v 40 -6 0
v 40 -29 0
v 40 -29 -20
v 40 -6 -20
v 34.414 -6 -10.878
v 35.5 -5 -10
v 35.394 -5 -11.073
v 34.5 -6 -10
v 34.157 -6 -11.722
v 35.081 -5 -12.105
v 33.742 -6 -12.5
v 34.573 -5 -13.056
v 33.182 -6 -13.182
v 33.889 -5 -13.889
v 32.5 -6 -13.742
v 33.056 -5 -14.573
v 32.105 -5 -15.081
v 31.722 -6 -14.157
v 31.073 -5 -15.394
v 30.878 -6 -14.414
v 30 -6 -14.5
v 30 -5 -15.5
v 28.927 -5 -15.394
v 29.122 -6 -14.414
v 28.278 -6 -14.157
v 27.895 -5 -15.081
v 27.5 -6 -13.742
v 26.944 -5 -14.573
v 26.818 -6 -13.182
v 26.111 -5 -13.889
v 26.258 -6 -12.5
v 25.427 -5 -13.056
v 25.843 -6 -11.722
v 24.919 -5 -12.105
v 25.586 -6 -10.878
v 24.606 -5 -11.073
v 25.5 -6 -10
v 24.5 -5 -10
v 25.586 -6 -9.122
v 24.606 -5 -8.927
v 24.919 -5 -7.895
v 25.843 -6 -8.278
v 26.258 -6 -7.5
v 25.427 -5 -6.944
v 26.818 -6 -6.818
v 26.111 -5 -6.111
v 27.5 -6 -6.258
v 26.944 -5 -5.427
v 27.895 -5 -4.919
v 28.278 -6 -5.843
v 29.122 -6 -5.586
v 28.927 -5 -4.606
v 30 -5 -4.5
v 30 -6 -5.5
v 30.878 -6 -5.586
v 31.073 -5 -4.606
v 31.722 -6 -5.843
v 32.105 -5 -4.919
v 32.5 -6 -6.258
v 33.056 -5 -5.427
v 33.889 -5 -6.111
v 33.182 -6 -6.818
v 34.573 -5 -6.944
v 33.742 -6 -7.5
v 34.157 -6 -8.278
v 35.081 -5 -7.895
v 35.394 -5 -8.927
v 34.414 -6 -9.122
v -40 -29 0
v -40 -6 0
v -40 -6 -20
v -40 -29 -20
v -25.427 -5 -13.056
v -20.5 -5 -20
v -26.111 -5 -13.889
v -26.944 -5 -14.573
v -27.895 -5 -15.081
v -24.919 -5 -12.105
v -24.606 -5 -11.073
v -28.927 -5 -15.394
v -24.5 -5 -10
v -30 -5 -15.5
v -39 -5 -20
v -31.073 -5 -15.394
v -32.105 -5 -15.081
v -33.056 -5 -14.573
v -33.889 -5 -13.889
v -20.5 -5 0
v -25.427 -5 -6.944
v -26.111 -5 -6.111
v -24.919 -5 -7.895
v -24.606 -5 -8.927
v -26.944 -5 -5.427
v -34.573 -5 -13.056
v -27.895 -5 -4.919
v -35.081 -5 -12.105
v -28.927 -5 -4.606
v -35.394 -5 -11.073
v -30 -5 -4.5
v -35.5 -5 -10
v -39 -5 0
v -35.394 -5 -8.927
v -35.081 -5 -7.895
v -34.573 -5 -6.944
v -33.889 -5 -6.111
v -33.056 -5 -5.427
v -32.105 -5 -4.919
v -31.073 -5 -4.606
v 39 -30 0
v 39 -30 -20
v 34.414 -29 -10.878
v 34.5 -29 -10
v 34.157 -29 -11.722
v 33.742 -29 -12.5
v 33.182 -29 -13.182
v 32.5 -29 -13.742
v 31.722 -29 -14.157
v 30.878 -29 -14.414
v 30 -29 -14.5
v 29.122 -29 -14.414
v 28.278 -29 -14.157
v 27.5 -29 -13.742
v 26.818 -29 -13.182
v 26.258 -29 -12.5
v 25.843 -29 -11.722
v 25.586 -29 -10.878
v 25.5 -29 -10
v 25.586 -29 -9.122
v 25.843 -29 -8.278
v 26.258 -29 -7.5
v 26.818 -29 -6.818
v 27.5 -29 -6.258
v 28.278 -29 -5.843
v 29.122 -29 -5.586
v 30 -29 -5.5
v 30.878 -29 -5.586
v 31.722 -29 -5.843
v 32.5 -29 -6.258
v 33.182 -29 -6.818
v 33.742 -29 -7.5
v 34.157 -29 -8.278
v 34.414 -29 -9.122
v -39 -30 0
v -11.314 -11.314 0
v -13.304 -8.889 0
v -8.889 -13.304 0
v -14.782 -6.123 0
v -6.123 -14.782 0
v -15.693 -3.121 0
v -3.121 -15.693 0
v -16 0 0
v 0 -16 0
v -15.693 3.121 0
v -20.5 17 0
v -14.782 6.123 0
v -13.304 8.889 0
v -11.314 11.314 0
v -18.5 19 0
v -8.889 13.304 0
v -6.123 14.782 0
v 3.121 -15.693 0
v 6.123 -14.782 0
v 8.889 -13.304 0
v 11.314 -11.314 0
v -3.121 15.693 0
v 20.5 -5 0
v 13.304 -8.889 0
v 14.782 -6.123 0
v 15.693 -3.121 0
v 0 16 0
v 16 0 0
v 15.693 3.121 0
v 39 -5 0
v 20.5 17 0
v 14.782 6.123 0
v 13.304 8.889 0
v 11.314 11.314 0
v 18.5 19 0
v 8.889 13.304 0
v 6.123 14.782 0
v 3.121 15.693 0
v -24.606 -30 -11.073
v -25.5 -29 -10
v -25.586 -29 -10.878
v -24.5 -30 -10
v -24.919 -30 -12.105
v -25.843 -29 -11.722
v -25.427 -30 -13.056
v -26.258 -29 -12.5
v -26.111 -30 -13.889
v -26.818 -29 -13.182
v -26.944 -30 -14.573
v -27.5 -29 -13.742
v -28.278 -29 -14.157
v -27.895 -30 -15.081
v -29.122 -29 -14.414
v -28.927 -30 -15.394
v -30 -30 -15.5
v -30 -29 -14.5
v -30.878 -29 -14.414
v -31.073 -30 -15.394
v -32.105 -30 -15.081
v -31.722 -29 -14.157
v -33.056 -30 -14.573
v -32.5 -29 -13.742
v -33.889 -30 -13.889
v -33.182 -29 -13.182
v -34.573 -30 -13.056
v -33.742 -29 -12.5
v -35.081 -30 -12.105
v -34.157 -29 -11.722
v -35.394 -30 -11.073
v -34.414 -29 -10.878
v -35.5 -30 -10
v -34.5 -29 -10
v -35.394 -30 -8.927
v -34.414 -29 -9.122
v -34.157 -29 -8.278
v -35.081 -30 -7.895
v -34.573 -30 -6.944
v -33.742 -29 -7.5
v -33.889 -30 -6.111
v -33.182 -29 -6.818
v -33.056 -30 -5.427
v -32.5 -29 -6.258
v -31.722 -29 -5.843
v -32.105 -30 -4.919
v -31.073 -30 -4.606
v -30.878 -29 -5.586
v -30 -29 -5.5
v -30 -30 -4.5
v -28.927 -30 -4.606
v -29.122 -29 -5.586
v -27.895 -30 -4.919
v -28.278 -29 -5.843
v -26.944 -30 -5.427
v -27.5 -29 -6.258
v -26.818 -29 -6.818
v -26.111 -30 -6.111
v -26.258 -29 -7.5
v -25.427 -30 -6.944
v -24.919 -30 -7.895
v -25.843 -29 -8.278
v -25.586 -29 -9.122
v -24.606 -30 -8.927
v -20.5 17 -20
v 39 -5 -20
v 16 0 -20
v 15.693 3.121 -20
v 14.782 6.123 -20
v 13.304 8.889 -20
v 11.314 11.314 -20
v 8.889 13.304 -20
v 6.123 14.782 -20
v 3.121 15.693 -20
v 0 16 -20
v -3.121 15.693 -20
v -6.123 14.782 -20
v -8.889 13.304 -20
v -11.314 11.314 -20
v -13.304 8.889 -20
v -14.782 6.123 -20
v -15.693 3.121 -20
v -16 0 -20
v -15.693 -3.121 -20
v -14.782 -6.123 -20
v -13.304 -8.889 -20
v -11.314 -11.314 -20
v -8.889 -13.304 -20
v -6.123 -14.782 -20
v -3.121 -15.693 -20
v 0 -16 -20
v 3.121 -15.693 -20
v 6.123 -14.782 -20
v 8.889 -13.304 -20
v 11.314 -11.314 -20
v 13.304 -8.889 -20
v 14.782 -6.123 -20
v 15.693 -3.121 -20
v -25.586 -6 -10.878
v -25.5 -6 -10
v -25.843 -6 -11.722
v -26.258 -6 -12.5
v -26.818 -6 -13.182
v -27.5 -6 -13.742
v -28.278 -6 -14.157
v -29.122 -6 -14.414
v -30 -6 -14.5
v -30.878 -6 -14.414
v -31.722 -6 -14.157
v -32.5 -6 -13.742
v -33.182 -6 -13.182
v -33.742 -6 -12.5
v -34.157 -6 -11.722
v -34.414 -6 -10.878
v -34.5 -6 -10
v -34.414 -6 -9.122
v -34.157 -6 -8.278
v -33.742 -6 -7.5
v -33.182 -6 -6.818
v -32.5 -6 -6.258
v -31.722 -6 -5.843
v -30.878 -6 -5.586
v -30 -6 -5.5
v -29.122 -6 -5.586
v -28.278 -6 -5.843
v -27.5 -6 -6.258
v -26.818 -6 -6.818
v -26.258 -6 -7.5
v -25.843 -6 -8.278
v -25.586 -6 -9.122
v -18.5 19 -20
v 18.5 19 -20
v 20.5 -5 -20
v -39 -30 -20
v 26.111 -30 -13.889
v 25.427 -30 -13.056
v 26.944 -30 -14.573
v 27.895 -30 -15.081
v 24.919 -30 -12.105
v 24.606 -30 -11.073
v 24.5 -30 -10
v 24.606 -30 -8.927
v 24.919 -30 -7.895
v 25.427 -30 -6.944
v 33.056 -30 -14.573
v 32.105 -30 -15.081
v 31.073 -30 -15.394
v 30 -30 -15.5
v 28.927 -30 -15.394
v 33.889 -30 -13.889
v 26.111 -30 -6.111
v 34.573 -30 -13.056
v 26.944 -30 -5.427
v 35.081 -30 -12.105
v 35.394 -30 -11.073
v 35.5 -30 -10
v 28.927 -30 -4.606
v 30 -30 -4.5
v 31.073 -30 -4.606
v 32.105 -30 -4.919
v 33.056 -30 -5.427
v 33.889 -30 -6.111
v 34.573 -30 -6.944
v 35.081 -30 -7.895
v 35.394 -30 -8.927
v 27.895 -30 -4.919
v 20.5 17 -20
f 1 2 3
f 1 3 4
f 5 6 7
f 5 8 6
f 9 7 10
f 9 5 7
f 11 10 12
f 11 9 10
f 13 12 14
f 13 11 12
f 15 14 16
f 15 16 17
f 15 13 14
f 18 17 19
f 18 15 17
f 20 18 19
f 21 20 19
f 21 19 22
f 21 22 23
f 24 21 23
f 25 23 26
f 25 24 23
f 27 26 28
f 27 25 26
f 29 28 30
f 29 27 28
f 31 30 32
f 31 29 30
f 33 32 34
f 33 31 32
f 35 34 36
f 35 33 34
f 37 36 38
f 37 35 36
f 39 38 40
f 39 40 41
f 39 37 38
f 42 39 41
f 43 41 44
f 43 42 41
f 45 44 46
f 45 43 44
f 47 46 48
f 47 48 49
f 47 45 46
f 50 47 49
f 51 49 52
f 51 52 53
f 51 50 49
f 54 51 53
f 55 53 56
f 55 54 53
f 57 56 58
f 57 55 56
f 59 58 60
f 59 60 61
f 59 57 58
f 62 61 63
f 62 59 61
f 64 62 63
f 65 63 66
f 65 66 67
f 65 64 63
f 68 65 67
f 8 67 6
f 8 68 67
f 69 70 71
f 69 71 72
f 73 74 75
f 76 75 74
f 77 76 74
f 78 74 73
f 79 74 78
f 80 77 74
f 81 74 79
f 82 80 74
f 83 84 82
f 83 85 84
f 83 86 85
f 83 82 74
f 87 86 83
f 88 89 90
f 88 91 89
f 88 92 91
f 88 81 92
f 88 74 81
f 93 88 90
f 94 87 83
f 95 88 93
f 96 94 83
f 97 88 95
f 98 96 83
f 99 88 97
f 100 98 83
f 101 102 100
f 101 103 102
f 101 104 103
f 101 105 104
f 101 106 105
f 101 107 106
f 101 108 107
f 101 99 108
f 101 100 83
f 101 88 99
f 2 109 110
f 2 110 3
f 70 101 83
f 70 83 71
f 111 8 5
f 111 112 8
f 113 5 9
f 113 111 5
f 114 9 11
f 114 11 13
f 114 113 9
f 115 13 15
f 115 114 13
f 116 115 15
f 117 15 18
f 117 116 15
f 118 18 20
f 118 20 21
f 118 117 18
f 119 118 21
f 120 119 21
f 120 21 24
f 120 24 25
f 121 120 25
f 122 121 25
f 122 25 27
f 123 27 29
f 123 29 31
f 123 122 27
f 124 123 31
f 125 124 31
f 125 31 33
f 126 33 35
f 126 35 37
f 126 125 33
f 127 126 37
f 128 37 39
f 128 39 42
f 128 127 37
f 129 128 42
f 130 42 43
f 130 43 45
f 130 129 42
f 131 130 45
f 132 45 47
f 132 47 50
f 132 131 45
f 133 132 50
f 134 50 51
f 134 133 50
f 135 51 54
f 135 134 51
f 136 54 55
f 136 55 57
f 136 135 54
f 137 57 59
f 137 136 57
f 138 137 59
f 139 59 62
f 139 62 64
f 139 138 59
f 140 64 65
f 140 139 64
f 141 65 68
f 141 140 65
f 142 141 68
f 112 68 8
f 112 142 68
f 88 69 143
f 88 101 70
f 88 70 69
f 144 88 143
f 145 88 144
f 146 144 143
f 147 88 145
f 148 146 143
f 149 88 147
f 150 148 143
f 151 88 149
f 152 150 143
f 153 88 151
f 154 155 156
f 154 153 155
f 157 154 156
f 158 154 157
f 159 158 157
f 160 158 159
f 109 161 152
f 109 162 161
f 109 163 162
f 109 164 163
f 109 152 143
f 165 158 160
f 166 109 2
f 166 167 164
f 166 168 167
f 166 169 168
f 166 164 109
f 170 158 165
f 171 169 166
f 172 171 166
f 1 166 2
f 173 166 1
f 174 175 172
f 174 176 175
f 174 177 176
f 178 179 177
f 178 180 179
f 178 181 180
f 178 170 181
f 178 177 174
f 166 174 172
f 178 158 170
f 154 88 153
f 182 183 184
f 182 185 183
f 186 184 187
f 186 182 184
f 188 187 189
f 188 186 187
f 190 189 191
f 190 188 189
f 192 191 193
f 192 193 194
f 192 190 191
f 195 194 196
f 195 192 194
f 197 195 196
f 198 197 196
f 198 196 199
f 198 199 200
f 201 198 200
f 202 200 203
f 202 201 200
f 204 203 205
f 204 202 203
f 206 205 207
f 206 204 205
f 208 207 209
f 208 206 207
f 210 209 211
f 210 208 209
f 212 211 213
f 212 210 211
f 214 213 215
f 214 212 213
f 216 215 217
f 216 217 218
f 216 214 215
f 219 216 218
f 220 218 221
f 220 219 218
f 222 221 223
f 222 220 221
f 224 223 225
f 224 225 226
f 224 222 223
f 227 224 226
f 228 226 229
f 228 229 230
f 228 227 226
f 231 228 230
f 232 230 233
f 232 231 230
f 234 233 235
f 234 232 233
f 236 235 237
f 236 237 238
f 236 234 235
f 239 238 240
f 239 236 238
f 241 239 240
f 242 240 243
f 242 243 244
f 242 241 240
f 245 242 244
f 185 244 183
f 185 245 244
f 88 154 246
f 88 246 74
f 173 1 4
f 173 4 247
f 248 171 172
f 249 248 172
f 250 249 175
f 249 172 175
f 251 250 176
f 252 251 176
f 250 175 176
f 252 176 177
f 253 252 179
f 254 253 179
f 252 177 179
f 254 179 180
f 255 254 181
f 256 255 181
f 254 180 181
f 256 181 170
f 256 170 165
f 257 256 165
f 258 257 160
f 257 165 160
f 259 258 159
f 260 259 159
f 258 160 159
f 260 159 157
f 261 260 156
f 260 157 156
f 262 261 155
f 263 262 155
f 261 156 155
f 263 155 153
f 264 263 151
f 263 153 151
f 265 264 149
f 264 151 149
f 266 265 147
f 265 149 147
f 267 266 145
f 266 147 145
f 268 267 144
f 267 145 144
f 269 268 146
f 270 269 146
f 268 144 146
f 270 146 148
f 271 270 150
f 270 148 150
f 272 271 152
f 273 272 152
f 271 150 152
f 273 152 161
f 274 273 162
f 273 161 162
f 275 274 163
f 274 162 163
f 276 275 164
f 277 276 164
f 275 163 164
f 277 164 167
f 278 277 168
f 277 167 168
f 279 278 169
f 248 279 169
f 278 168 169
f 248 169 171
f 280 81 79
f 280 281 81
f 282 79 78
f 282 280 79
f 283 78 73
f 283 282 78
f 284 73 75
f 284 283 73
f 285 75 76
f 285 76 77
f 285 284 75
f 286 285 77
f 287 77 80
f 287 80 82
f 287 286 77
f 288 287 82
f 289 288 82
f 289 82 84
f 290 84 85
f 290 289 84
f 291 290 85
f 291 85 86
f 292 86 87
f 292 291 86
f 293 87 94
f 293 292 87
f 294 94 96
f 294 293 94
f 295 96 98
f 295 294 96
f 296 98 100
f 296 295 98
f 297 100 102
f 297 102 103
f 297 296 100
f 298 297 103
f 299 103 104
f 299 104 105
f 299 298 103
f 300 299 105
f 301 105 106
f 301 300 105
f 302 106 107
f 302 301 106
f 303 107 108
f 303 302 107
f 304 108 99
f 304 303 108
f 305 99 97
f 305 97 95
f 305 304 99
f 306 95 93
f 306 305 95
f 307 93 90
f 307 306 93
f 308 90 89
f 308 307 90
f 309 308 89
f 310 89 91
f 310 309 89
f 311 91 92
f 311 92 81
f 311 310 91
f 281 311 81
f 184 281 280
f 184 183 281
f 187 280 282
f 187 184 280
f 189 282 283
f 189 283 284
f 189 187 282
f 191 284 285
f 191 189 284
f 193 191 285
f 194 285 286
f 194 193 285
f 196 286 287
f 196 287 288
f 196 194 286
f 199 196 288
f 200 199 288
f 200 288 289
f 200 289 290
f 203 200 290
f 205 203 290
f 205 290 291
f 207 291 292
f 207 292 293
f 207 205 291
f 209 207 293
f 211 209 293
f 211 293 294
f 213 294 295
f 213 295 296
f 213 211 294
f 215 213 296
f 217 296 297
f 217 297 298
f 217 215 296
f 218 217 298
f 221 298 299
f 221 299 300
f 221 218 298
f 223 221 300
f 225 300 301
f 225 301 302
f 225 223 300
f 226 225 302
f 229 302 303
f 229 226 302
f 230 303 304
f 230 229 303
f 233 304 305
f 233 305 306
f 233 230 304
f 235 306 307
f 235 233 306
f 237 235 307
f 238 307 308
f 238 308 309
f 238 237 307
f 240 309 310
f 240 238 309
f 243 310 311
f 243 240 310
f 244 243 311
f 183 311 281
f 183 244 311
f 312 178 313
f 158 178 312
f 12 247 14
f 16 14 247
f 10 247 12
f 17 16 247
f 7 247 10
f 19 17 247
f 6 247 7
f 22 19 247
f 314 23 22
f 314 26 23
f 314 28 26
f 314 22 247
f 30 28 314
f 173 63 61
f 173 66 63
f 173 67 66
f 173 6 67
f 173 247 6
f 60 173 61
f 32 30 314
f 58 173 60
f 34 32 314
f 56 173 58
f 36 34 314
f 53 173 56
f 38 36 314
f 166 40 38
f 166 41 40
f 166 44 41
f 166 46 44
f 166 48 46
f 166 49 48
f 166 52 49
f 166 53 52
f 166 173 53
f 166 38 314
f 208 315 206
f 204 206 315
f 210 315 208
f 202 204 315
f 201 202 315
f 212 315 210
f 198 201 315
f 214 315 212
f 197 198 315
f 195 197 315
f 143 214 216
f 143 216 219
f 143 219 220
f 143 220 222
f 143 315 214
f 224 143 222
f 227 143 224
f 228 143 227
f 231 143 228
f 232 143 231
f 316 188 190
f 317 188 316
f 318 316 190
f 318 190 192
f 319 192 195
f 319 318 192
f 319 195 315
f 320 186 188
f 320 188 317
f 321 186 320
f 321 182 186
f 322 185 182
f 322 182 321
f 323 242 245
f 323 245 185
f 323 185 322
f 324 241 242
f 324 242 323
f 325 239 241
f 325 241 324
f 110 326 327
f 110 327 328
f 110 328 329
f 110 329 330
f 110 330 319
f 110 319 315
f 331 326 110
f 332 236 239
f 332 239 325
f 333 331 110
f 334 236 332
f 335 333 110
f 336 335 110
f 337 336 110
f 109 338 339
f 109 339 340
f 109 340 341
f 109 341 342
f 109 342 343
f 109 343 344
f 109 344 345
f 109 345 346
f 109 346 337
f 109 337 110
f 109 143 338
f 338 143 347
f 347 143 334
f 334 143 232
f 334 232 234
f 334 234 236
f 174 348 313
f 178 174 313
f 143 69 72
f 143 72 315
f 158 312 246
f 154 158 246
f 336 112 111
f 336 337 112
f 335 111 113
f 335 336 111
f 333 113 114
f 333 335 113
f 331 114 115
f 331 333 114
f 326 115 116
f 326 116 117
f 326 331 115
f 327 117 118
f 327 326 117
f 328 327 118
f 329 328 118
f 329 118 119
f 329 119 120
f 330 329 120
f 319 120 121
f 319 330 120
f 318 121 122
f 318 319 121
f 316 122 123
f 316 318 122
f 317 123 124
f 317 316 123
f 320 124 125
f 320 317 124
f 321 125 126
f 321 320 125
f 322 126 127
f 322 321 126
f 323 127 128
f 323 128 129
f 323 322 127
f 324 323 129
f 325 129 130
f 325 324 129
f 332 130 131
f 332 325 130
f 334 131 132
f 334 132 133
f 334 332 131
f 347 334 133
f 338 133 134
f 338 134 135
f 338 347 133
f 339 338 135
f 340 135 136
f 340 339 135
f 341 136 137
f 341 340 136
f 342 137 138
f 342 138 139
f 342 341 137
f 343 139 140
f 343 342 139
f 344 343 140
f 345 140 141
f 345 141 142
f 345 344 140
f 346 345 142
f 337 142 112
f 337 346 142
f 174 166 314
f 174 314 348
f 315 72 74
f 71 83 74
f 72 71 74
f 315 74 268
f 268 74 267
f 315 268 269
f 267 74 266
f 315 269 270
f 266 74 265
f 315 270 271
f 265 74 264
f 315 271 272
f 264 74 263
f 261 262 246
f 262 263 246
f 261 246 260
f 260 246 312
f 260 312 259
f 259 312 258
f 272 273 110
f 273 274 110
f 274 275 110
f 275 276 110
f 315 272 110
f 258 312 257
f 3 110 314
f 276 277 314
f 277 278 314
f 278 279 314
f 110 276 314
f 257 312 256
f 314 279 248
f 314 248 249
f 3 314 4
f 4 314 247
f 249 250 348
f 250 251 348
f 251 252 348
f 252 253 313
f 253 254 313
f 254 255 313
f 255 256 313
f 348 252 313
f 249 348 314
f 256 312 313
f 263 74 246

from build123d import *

# Parameters (mm, degrees)
SKETCH1_R           = 16
BOSS_EXTRUDE1_DEPTH = 20


with BuildPart() as part:
    # Sketch1 → Boss-Extrude1 (new body)
    with BuildSketch(Plane.XY):
        Polygon((-40, -29), (-39, -30), (39, -30), (40, -29), (40, -6), (39, -5), (20.5, -5), (20.5, 17), (18.5, 19), (-18.5, 19), (-20.5, 17), (-20.5, -5), (-39, -5), (-40, -6), align=None)
        Circle(SKETCH1_R, mode=Mode.SUBTRACT)
    extrude(amount=-BOSS_EXTRUDE1_DEPTH)

    # Sketch2 → Cut-Revolve1 (revolve, cut)
    with BuildSketch(Plane.XY.offset(-10)):
        Polygon((30, -5), (35.5, -5), (34.5, -6), (34.5, -29), (35.5, -30), (30, -30), align=None)
    revolve(axis=Axis((30, -30, -10), (0, 1, 0)), mode=Mode.SUBTRACT)

    # Sketch3 → Cut-Revolve2 (revolve, cut)
    with BuildSketch(Plane.XY.offset(-10)):
        Polygon((-30, -5), (-24.5, -5), (-25.5, -6), (-25.5, -29), (-24.5, -30), (-30, -30), align=None)
    revolve(axis=Axis((-30, -30, -10), (0, 1, 0)), mode=Mode.SUBTRACT)


solid = part.part
